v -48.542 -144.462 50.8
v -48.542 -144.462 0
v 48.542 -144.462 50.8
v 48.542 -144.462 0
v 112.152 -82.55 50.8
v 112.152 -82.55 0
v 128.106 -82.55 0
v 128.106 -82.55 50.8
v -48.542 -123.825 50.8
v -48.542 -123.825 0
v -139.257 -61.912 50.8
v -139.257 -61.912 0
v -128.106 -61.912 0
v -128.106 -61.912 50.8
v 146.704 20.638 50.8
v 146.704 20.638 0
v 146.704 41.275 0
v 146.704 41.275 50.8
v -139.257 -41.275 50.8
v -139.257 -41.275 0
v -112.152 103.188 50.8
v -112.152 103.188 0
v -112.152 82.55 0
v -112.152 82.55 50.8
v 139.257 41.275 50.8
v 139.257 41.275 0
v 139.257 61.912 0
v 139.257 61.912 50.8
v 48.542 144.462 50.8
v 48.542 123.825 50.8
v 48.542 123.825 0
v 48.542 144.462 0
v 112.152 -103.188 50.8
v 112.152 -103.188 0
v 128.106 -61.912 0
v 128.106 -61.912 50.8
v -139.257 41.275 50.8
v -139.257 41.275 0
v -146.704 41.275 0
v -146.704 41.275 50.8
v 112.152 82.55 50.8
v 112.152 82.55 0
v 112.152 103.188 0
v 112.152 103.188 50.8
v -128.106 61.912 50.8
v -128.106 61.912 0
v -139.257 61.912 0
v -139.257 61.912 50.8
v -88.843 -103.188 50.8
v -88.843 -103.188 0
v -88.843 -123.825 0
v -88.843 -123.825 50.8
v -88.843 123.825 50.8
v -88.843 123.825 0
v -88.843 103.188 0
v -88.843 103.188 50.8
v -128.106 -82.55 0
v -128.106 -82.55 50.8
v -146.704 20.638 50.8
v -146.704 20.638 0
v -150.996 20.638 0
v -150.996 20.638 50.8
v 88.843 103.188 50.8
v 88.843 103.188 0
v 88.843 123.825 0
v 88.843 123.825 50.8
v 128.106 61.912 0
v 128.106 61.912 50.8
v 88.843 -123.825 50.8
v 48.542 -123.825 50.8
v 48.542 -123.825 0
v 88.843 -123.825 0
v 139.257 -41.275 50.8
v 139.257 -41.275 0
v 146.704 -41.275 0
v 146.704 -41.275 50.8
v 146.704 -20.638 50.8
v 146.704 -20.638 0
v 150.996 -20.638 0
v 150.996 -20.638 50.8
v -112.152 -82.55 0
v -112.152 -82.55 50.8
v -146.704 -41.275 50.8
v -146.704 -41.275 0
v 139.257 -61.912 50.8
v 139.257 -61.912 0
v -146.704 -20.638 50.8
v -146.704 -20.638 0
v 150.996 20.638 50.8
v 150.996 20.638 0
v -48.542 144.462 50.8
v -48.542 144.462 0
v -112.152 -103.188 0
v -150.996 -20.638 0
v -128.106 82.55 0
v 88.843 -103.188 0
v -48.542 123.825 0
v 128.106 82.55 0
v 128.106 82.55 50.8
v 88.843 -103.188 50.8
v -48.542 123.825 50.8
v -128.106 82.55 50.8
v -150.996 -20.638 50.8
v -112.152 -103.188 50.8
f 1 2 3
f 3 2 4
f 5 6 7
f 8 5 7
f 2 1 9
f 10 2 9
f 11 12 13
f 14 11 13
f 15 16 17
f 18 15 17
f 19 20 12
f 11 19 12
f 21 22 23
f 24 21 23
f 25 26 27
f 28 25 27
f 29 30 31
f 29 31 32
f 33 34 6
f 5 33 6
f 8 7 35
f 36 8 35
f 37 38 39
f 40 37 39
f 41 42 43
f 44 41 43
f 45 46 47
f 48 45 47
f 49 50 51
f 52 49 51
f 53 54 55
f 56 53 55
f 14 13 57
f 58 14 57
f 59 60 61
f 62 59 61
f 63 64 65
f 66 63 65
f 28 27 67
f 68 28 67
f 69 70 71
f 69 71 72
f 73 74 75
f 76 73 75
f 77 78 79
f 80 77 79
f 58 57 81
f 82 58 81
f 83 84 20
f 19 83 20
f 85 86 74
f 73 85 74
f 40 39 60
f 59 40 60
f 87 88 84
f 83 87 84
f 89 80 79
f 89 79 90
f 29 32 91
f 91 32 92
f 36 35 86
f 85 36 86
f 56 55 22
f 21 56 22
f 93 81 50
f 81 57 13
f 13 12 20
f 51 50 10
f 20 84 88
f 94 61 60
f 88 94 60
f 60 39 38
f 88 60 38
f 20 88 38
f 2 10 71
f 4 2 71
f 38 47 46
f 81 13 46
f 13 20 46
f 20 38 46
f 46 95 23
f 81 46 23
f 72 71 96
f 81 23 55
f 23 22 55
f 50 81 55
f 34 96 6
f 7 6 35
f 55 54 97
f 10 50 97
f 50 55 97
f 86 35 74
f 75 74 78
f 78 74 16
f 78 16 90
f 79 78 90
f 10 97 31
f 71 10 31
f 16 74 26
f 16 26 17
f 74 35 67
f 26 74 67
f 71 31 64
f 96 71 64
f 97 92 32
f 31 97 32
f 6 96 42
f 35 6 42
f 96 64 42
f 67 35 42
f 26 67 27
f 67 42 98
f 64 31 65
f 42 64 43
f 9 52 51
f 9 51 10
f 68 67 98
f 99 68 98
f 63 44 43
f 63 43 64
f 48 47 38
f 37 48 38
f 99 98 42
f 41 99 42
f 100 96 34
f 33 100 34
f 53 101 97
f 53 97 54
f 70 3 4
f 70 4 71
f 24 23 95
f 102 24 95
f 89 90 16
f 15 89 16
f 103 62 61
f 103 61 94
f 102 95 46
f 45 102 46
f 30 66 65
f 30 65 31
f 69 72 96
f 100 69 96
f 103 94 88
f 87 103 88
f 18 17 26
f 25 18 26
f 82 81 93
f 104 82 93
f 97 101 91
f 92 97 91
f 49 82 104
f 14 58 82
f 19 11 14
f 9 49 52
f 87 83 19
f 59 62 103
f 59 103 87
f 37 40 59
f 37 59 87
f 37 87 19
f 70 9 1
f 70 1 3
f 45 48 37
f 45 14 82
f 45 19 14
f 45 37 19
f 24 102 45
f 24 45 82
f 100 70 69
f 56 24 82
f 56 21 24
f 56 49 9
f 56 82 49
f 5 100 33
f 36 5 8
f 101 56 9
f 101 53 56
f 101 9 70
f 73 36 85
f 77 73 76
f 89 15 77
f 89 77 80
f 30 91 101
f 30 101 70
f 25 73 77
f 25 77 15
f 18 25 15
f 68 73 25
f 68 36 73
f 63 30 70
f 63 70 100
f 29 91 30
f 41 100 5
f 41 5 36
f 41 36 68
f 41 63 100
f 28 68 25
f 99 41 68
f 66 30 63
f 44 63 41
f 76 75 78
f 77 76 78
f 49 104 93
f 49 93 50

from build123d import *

# Parameters (mm, degrees)
F0_W     = 13.951736
F0_H     = 20.6375
F0_W_2   = 83.132682
F1_DEPTH = 50.8
F2_W     = 129.48776
F2_H     = 20.6375
F3_DEPTH = 50.8


with BuildPart() as f1:
    # F0 (on Top) → F1 (new body)
    with BuildSketch(Plane.XY):
        Polygon((-150.996204, 0), (-31.4737, 0), (31.4737, 0), (31.4737, 20.6375), (-22.181449, 20.6375), (-146.704241, 20.6375), (-150.996204, 20.6375), align=None)
        Polygon((31.4737, 0), (-31.4737, 0), (-31.4737, -20.6375), (22.181449, -20.6375), (146.704241, -20.6375), (150.996204, -20.6375), (150.996204, 0), align=None)
        Polygon((-31.4737, -20.6375), (-31.4737, 0), (-150.996204, 0), (-150.996204, -20.6375), (-146.704241, -20.6375), align=None)
        Polygon((31.4737, 20.6375), (31.4737, 0), (150.996204, 0), (150.996204, 20.6375), (146.704241, 20.6375), align=None)
        Polygon((22.181449, -20.6375), (-31.4737, -20.6375), (-146.704241, -20.6375), (-146.704241, -41.275), (-139.257324, -41.275), (-70.105411, -41.275), (22.181449, -41.275), align=None)
        Polygon((-22.181449, 20.6375), (31.4737, 20.6375), (146.704241, 20.6375), (146.704241, 41.275), (139.257324, 41.275), (70.105411, 41.275), (-22.181449, 41.275), align=None)
        Polygon((146.704241, -20.6375), (22.181449, -20.6375), (22.181449, -41.275), (139.257324, -41.275), (146.704241, -41.275), align=None)
        Polygon((-146.704241, 20.6375), (-22.181449, 20.6375), (-22.181449, 41.275), (-139.257324, 41.275), (-146.704241, 41.275), align=None)
        Polygon((139.257324, -41.275), (22.181449, -41.275), (-70.105411, -41.275), (-70.105411, -61.9125), (-32.869801, -61.9125), (96.617959, -61.9125), (128.10643, -61.9125), (139.257324, -61.9125), align=None)
        Polygon((-139.257324, 41.275), (-22.181449, 41.275), (70.105411, 41.275), (70.105411, 61.9125), (32.869801, 61.9125), (-96.617959, 61.9125), (-128.10643, 61.9125), (-139.257324, 61.9125), align=None)
        Polygon((-70.105411, -61.9125), (-70.105411, -41.275), (-139.257324, -41.275), (-139.257324, -61.9125), (-128.10643, -61.9125), align=None)
        Polygon((70.105411, 41.275), (139.257324, 41.275), (139.257324, 61.9125), (128.10643, 61.9125), (70.105411, 61.9125), align=None)
        Polygon((-32.869801, -61.9125), (-70.105411, -61.9125), (-128.10643, -61.9125), (-128.10643, -82.55), (-112.152128, -82.55), (-32.869801, -82.55), align=None)
        Polygon((32.869801, 61.9125), (70.105411, 61.9125), (128.10643, 61.9125), (128.10643, 82.55), (112.152128, 82.55), (32.869801, 82.55), align=None)
        Polygon((128.10643, -82.55), (128.10643, -61.9125), (96.617959, -61.9125), (96.617959, -82.55), (112.152128, -82.55), align=None)
        Polygon((-128.10643, 82.55), (-128.10643, 61.9125), (-96.617959, 61.9125), (-96.617959, 82.55), (-112.152128, 82.55), align=None)
        Polygon((55.90756, -82.55), (-32.869801, -82.55), (-112.152128, -82.55), (-112.152128, -103.1875), (-88.843285, -103.1875), (55.90756, -103.1875), align=None)
        Polygon((-55.90756, 82.55), (32.869801, 82.55), (112.152128, 82.55), (112.152128, 103.1875), (88.843285, 103.1875), (-55.90756, 103.1875), align=None)
        Polygon((112.152128, -82.55), (96.617959, -82.55), (55.90756, -82.55), (55.90756, -103.1875), (88.843285, -103.1875), (112.152128, -103.1875), align=None)
        Polygon((-112.152128, 82.55), (-96.617959, 82.55), (-55.90756, 82.55), (-55.90756, 103.1875), (-88.843285, 103.1875), (-112.152128, 103.1875), align=None)
        Polygon((88.843285, -103.1875), (55.90756, -103.1875), (-88.843285, -103.1875), (-88.843285, -123.825), (-48.542209, -123.825), (34.590473, -123.825), (48.542209, -123.825), (88.843285, -123.825), align=None)
        Polygon((-88.843285, 103.1875), (-55.90756, 103.1875), (88.843285, 103.1875), (88.843285, 123.825), (48.542209, 123.825), (-34.590473, 123.825), (-48.542209, 123.825), (-88.843285, 123.825), align=None)
        with Locations((41.566341, -134.14375)):
            Rectangle(F0_W, F0_H)
        with Locations((-6.975868, -134.14375)):
            Rectangle(F0_W_2, F0_H)
        with Locations((6.975868, 134.14375)):
            Rectangle(F0_W_2, F0_H)
        with Locations((-41.566341, 134.14375)):
            Rectangle(F0_W, F0_H)
    extrude(amount=F1_DEPTH)

    # F2 (on face) → F3 (join)
    with BuildSketch(Plane.XY.offset(50.8)):
        with Locations((31.874079, -72.23125)):
            Rectangle(F2_W, F2_H)
        with Locations((-31.874079, 72.23125)):
            Rectangle(F2_W, F2_H)
    extrude(amount=-F3_DEPTH)


solid = f1.part
